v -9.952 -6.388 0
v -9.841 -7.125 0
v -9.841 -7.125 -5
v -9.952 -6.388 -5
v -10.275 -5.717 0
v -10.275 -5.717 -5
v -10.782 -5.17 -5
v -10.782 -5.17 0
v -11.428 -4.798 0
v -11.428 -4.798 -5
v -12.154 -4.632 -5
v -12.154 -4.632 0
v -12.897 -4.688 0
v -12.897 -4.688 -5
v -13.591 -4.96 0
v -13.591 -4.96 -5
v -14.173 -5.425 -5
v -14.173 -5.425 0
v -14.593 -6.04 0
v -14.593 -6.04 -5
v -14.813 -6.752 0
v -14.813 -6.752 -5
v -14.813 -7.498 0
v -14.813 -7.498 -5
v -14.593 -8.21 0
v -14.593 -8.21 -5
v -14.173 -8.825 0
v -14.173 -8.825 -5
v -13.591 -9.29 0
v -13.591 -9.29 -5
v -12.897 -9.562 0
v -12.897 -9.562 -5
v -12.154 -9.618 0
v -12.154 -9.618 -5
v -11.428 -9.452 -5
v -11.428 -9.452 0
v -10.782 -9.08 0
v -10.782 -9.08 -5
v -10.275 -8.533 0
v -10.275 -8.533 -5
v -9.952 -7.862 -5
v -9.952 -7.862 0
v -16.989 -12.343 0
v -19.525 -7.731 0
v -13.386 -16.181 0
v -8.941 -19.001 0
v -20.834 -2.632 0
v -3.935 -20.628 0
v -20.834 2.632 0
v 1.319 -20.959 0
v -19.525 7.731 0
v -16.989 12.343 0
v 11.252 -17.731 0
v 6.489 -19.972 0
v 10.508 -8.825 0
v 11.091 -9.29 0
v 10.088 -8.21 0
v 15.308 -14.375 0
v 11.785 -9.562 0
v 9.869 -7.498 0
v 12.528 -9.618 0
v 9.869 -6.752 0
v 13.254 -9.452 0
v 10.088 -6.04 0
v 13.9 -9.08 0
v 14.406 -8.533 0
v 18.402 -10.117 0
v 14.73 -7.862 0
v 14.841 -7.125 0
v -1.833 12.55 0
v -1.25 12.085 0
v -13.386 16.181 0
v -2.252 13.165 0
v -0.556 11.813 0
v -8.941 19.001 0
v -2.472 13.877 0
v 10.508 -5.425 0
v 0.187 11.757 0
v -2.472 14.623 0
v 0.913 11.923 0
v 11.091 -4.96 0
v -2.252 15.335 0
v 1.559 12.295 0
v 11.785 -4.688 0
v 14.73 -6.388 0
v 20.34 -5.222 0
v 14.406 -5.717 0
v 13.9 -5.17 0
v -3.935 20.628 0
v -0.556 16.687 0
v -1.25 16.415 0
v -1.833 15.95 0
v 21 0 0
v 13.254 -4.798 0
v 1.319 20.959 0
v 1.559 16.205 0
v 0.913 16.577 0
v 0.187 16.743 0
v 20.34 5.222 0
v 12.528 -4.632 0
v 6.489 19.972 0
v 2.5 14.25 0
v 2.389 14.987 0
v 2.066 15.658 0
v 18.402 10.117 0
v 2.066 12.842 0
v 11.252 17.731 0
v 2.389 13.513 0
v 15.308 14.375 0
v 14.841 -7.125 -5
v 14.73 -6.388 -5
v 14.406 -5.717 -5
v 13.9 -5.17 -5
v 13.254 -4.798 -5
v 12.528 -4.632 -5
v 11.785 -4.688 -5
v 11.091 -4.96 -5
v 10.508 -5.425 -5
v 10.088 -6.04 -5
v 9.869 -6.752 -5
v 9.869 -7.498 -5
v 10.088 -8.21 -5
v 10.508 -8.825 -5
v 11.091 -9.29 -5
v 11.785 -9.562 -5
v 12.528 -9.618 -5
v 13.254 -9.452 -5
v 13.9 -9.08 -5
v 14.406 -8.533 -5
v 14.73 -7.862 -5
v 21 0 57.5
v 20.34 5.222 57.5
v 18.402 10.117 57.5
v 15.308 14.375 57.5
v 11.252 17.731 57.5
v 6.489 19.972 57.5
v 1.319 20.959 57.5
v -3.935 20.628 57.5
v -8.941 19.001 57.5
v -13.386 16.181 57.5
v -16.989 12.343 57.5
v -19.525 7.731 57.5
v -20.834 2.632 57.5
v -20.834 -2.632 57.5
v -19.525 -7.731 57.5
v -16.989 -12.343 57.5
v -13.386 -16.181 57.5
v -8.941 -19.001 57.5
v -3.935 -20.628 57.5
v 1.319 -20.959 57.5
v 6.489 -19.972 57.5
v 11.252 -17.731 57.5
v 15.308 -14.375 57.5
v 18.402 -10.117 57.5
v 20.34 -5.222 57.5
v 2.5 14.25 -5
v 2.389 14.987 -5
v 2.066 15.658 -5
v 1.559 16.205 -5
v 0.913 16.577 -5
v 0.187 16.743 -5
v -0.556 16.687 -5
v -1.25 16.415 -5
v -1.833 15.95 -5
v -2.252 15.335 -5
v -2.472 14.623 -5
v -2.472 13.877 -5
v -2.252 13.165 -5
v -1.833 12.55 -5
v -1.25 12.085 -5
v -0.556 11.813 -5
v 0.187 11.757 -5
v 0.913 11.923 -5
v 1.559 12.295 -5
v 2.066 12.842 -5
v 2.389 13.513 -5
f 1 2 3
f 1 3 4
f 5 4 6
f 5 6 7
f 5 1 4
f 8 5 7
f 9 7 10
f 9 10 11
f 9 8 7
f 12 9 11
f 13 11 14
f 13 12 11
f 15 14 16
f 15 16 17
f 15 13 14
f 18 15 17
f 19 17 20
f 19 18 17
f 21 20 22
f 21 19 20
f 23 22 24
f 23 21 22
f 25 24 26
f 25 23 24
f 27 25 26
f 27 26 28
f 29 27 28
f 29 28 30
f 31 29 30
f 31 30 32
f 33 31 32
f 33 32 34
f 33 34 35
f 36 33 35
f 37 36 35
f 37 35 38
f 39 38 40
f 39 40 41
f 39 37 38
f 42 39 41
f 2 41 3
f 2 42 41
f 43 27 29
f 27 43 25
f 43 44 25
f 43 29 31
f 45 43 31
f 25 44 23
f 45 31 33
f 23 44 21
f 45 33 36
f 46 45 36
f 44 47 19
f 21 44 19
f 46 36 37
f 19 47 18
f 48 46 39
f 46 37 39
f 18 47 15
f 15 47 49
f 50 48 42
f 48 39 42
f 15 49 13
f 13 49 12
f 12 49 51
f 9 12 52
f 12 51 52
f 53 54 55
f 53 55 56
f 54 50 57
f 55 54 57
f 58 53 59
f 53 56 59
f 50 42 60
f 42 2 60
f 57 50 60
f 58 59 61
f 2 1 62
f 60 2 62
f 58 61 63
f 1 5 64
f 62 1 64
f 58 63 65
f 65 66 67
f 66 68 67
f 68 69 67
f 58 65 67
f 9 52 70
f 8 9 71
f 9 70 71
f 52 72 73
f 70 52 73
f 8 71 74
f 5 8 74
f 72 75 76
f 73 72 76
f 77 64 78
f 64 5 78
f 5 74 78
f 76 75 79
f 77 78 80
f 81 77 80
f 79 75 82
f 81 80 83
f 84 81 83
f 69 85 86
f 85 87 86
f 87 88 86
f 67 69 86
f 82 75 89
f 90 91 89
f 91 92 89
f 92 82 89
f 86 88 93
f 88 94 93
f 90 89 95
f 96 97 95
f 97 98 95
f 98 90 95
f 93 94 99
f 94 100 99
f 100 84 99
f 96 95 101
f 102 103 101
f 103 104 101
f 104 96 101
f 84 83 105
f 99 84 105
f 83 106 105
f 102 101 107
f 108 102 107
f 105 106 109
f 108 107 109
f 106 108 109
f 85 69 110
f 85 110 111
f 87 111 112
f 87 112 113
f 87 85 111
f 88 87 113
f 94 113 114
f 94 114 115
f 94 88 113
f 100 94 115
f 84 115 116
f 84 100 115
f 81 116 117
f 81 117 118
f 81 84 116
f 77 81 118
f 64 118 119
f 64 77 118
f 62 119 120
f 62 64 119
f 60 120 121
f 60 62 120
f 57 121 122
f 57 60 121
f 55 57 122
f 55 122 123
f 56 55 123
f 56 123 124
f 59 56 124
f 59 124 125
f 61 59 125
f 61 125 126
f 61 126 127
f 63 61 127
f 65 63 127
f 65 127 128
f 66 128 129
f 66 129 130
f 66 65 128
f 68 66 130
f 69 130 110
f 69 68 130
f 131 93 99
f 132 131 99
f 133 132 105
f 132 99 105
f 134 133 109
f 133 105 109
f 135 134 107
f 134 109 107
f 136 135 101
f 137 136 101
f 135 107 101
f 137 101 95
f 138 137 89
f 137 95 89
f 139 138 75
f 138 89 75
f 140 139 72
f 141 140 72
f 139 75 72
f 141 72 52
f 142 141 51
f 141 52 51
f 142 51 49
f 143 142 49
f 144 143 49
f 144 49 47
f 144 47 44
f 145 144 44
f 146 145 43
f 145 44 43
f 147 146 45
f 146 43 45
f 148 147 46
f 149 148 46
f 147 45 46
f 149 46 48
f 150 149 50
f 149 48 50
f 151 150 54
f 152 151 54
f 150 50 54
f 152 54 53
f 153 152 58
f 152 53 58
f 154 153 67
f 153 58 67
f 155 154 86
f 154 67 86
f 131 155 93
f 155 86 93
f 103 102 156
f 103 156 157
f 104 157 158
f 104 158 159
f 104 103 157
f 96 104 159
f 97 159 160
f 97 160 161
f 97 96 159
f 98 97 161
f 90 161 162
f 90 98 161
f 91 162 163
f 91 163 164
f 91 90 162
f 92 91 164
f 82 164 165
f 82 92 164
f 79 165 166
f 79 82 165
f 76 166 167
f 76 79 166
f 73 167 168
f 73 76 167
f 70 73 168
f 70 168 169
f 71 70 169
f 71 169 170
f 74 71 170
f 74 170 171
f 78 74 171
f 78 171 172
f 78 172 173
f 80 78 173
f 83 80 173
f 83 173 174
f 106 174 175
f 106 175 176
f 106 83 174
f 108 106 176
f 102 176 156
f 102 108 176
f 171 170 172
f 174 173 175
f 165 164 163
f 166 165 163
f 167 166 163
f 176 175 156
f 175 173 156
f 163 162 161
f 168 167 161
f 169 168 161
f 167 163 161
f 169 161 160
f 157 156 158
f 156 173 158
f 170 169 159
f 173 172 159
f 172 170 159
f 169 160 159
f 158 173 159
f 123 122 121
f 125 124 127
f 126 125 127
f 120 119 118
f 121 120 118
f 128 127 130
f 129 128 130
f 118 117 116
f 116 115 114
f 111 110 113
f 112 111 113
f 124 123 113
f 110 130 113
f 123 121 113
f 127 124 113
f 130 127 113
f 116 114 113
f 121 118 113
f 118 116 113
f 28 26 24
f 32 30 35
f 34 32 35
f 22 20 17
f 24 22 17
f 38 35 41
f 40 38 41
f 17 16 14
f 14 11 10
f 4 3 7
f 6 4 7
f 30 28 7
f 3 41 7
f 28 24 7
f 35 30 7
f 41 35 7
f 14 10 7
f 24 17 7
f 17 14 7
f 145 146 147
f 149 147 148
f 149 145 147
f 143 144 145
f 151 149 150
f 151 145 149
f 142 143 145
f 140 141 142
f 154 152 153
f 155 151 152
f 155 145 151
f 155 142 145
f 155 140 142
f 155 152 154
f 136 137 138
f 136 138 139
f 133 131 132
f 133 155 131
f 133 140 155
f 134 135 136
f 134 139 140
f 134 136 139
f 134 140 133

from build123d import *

# Parameters (mm, degrees)
SKETCH1_R           = 21
BOSS_EXTRUDE1_DEPTH = 57.5
SKETCH2_R           = 2.5
BOSS_EXTRUDE2_DEPTH = 5


with BuildPart() as part:
    # Sketch1 → Boss-Extrude1 (new body)
    with BuildSketch(Plane.XY):
        Circle(SKETCH1_R)
    extrude(amount=BOSS_EXTRUDE1_DEPTH)

    # Sketch2 → Boss-Extrude2 (add)
    with BuildSketch(Plane.XY):
        with Locations((0, 14.25)):
            Circle(SKETCH2_R)
        with Locations((12.340862004, -7.125)):
            Circle(SKETCH2_R)
        with Locations((-12.340862004, -7.125)):
            Circle(SKETCH2_R)
    extrude(amount=-BOSS_EXTRUDE2_DEPTH)


solid = part.part
